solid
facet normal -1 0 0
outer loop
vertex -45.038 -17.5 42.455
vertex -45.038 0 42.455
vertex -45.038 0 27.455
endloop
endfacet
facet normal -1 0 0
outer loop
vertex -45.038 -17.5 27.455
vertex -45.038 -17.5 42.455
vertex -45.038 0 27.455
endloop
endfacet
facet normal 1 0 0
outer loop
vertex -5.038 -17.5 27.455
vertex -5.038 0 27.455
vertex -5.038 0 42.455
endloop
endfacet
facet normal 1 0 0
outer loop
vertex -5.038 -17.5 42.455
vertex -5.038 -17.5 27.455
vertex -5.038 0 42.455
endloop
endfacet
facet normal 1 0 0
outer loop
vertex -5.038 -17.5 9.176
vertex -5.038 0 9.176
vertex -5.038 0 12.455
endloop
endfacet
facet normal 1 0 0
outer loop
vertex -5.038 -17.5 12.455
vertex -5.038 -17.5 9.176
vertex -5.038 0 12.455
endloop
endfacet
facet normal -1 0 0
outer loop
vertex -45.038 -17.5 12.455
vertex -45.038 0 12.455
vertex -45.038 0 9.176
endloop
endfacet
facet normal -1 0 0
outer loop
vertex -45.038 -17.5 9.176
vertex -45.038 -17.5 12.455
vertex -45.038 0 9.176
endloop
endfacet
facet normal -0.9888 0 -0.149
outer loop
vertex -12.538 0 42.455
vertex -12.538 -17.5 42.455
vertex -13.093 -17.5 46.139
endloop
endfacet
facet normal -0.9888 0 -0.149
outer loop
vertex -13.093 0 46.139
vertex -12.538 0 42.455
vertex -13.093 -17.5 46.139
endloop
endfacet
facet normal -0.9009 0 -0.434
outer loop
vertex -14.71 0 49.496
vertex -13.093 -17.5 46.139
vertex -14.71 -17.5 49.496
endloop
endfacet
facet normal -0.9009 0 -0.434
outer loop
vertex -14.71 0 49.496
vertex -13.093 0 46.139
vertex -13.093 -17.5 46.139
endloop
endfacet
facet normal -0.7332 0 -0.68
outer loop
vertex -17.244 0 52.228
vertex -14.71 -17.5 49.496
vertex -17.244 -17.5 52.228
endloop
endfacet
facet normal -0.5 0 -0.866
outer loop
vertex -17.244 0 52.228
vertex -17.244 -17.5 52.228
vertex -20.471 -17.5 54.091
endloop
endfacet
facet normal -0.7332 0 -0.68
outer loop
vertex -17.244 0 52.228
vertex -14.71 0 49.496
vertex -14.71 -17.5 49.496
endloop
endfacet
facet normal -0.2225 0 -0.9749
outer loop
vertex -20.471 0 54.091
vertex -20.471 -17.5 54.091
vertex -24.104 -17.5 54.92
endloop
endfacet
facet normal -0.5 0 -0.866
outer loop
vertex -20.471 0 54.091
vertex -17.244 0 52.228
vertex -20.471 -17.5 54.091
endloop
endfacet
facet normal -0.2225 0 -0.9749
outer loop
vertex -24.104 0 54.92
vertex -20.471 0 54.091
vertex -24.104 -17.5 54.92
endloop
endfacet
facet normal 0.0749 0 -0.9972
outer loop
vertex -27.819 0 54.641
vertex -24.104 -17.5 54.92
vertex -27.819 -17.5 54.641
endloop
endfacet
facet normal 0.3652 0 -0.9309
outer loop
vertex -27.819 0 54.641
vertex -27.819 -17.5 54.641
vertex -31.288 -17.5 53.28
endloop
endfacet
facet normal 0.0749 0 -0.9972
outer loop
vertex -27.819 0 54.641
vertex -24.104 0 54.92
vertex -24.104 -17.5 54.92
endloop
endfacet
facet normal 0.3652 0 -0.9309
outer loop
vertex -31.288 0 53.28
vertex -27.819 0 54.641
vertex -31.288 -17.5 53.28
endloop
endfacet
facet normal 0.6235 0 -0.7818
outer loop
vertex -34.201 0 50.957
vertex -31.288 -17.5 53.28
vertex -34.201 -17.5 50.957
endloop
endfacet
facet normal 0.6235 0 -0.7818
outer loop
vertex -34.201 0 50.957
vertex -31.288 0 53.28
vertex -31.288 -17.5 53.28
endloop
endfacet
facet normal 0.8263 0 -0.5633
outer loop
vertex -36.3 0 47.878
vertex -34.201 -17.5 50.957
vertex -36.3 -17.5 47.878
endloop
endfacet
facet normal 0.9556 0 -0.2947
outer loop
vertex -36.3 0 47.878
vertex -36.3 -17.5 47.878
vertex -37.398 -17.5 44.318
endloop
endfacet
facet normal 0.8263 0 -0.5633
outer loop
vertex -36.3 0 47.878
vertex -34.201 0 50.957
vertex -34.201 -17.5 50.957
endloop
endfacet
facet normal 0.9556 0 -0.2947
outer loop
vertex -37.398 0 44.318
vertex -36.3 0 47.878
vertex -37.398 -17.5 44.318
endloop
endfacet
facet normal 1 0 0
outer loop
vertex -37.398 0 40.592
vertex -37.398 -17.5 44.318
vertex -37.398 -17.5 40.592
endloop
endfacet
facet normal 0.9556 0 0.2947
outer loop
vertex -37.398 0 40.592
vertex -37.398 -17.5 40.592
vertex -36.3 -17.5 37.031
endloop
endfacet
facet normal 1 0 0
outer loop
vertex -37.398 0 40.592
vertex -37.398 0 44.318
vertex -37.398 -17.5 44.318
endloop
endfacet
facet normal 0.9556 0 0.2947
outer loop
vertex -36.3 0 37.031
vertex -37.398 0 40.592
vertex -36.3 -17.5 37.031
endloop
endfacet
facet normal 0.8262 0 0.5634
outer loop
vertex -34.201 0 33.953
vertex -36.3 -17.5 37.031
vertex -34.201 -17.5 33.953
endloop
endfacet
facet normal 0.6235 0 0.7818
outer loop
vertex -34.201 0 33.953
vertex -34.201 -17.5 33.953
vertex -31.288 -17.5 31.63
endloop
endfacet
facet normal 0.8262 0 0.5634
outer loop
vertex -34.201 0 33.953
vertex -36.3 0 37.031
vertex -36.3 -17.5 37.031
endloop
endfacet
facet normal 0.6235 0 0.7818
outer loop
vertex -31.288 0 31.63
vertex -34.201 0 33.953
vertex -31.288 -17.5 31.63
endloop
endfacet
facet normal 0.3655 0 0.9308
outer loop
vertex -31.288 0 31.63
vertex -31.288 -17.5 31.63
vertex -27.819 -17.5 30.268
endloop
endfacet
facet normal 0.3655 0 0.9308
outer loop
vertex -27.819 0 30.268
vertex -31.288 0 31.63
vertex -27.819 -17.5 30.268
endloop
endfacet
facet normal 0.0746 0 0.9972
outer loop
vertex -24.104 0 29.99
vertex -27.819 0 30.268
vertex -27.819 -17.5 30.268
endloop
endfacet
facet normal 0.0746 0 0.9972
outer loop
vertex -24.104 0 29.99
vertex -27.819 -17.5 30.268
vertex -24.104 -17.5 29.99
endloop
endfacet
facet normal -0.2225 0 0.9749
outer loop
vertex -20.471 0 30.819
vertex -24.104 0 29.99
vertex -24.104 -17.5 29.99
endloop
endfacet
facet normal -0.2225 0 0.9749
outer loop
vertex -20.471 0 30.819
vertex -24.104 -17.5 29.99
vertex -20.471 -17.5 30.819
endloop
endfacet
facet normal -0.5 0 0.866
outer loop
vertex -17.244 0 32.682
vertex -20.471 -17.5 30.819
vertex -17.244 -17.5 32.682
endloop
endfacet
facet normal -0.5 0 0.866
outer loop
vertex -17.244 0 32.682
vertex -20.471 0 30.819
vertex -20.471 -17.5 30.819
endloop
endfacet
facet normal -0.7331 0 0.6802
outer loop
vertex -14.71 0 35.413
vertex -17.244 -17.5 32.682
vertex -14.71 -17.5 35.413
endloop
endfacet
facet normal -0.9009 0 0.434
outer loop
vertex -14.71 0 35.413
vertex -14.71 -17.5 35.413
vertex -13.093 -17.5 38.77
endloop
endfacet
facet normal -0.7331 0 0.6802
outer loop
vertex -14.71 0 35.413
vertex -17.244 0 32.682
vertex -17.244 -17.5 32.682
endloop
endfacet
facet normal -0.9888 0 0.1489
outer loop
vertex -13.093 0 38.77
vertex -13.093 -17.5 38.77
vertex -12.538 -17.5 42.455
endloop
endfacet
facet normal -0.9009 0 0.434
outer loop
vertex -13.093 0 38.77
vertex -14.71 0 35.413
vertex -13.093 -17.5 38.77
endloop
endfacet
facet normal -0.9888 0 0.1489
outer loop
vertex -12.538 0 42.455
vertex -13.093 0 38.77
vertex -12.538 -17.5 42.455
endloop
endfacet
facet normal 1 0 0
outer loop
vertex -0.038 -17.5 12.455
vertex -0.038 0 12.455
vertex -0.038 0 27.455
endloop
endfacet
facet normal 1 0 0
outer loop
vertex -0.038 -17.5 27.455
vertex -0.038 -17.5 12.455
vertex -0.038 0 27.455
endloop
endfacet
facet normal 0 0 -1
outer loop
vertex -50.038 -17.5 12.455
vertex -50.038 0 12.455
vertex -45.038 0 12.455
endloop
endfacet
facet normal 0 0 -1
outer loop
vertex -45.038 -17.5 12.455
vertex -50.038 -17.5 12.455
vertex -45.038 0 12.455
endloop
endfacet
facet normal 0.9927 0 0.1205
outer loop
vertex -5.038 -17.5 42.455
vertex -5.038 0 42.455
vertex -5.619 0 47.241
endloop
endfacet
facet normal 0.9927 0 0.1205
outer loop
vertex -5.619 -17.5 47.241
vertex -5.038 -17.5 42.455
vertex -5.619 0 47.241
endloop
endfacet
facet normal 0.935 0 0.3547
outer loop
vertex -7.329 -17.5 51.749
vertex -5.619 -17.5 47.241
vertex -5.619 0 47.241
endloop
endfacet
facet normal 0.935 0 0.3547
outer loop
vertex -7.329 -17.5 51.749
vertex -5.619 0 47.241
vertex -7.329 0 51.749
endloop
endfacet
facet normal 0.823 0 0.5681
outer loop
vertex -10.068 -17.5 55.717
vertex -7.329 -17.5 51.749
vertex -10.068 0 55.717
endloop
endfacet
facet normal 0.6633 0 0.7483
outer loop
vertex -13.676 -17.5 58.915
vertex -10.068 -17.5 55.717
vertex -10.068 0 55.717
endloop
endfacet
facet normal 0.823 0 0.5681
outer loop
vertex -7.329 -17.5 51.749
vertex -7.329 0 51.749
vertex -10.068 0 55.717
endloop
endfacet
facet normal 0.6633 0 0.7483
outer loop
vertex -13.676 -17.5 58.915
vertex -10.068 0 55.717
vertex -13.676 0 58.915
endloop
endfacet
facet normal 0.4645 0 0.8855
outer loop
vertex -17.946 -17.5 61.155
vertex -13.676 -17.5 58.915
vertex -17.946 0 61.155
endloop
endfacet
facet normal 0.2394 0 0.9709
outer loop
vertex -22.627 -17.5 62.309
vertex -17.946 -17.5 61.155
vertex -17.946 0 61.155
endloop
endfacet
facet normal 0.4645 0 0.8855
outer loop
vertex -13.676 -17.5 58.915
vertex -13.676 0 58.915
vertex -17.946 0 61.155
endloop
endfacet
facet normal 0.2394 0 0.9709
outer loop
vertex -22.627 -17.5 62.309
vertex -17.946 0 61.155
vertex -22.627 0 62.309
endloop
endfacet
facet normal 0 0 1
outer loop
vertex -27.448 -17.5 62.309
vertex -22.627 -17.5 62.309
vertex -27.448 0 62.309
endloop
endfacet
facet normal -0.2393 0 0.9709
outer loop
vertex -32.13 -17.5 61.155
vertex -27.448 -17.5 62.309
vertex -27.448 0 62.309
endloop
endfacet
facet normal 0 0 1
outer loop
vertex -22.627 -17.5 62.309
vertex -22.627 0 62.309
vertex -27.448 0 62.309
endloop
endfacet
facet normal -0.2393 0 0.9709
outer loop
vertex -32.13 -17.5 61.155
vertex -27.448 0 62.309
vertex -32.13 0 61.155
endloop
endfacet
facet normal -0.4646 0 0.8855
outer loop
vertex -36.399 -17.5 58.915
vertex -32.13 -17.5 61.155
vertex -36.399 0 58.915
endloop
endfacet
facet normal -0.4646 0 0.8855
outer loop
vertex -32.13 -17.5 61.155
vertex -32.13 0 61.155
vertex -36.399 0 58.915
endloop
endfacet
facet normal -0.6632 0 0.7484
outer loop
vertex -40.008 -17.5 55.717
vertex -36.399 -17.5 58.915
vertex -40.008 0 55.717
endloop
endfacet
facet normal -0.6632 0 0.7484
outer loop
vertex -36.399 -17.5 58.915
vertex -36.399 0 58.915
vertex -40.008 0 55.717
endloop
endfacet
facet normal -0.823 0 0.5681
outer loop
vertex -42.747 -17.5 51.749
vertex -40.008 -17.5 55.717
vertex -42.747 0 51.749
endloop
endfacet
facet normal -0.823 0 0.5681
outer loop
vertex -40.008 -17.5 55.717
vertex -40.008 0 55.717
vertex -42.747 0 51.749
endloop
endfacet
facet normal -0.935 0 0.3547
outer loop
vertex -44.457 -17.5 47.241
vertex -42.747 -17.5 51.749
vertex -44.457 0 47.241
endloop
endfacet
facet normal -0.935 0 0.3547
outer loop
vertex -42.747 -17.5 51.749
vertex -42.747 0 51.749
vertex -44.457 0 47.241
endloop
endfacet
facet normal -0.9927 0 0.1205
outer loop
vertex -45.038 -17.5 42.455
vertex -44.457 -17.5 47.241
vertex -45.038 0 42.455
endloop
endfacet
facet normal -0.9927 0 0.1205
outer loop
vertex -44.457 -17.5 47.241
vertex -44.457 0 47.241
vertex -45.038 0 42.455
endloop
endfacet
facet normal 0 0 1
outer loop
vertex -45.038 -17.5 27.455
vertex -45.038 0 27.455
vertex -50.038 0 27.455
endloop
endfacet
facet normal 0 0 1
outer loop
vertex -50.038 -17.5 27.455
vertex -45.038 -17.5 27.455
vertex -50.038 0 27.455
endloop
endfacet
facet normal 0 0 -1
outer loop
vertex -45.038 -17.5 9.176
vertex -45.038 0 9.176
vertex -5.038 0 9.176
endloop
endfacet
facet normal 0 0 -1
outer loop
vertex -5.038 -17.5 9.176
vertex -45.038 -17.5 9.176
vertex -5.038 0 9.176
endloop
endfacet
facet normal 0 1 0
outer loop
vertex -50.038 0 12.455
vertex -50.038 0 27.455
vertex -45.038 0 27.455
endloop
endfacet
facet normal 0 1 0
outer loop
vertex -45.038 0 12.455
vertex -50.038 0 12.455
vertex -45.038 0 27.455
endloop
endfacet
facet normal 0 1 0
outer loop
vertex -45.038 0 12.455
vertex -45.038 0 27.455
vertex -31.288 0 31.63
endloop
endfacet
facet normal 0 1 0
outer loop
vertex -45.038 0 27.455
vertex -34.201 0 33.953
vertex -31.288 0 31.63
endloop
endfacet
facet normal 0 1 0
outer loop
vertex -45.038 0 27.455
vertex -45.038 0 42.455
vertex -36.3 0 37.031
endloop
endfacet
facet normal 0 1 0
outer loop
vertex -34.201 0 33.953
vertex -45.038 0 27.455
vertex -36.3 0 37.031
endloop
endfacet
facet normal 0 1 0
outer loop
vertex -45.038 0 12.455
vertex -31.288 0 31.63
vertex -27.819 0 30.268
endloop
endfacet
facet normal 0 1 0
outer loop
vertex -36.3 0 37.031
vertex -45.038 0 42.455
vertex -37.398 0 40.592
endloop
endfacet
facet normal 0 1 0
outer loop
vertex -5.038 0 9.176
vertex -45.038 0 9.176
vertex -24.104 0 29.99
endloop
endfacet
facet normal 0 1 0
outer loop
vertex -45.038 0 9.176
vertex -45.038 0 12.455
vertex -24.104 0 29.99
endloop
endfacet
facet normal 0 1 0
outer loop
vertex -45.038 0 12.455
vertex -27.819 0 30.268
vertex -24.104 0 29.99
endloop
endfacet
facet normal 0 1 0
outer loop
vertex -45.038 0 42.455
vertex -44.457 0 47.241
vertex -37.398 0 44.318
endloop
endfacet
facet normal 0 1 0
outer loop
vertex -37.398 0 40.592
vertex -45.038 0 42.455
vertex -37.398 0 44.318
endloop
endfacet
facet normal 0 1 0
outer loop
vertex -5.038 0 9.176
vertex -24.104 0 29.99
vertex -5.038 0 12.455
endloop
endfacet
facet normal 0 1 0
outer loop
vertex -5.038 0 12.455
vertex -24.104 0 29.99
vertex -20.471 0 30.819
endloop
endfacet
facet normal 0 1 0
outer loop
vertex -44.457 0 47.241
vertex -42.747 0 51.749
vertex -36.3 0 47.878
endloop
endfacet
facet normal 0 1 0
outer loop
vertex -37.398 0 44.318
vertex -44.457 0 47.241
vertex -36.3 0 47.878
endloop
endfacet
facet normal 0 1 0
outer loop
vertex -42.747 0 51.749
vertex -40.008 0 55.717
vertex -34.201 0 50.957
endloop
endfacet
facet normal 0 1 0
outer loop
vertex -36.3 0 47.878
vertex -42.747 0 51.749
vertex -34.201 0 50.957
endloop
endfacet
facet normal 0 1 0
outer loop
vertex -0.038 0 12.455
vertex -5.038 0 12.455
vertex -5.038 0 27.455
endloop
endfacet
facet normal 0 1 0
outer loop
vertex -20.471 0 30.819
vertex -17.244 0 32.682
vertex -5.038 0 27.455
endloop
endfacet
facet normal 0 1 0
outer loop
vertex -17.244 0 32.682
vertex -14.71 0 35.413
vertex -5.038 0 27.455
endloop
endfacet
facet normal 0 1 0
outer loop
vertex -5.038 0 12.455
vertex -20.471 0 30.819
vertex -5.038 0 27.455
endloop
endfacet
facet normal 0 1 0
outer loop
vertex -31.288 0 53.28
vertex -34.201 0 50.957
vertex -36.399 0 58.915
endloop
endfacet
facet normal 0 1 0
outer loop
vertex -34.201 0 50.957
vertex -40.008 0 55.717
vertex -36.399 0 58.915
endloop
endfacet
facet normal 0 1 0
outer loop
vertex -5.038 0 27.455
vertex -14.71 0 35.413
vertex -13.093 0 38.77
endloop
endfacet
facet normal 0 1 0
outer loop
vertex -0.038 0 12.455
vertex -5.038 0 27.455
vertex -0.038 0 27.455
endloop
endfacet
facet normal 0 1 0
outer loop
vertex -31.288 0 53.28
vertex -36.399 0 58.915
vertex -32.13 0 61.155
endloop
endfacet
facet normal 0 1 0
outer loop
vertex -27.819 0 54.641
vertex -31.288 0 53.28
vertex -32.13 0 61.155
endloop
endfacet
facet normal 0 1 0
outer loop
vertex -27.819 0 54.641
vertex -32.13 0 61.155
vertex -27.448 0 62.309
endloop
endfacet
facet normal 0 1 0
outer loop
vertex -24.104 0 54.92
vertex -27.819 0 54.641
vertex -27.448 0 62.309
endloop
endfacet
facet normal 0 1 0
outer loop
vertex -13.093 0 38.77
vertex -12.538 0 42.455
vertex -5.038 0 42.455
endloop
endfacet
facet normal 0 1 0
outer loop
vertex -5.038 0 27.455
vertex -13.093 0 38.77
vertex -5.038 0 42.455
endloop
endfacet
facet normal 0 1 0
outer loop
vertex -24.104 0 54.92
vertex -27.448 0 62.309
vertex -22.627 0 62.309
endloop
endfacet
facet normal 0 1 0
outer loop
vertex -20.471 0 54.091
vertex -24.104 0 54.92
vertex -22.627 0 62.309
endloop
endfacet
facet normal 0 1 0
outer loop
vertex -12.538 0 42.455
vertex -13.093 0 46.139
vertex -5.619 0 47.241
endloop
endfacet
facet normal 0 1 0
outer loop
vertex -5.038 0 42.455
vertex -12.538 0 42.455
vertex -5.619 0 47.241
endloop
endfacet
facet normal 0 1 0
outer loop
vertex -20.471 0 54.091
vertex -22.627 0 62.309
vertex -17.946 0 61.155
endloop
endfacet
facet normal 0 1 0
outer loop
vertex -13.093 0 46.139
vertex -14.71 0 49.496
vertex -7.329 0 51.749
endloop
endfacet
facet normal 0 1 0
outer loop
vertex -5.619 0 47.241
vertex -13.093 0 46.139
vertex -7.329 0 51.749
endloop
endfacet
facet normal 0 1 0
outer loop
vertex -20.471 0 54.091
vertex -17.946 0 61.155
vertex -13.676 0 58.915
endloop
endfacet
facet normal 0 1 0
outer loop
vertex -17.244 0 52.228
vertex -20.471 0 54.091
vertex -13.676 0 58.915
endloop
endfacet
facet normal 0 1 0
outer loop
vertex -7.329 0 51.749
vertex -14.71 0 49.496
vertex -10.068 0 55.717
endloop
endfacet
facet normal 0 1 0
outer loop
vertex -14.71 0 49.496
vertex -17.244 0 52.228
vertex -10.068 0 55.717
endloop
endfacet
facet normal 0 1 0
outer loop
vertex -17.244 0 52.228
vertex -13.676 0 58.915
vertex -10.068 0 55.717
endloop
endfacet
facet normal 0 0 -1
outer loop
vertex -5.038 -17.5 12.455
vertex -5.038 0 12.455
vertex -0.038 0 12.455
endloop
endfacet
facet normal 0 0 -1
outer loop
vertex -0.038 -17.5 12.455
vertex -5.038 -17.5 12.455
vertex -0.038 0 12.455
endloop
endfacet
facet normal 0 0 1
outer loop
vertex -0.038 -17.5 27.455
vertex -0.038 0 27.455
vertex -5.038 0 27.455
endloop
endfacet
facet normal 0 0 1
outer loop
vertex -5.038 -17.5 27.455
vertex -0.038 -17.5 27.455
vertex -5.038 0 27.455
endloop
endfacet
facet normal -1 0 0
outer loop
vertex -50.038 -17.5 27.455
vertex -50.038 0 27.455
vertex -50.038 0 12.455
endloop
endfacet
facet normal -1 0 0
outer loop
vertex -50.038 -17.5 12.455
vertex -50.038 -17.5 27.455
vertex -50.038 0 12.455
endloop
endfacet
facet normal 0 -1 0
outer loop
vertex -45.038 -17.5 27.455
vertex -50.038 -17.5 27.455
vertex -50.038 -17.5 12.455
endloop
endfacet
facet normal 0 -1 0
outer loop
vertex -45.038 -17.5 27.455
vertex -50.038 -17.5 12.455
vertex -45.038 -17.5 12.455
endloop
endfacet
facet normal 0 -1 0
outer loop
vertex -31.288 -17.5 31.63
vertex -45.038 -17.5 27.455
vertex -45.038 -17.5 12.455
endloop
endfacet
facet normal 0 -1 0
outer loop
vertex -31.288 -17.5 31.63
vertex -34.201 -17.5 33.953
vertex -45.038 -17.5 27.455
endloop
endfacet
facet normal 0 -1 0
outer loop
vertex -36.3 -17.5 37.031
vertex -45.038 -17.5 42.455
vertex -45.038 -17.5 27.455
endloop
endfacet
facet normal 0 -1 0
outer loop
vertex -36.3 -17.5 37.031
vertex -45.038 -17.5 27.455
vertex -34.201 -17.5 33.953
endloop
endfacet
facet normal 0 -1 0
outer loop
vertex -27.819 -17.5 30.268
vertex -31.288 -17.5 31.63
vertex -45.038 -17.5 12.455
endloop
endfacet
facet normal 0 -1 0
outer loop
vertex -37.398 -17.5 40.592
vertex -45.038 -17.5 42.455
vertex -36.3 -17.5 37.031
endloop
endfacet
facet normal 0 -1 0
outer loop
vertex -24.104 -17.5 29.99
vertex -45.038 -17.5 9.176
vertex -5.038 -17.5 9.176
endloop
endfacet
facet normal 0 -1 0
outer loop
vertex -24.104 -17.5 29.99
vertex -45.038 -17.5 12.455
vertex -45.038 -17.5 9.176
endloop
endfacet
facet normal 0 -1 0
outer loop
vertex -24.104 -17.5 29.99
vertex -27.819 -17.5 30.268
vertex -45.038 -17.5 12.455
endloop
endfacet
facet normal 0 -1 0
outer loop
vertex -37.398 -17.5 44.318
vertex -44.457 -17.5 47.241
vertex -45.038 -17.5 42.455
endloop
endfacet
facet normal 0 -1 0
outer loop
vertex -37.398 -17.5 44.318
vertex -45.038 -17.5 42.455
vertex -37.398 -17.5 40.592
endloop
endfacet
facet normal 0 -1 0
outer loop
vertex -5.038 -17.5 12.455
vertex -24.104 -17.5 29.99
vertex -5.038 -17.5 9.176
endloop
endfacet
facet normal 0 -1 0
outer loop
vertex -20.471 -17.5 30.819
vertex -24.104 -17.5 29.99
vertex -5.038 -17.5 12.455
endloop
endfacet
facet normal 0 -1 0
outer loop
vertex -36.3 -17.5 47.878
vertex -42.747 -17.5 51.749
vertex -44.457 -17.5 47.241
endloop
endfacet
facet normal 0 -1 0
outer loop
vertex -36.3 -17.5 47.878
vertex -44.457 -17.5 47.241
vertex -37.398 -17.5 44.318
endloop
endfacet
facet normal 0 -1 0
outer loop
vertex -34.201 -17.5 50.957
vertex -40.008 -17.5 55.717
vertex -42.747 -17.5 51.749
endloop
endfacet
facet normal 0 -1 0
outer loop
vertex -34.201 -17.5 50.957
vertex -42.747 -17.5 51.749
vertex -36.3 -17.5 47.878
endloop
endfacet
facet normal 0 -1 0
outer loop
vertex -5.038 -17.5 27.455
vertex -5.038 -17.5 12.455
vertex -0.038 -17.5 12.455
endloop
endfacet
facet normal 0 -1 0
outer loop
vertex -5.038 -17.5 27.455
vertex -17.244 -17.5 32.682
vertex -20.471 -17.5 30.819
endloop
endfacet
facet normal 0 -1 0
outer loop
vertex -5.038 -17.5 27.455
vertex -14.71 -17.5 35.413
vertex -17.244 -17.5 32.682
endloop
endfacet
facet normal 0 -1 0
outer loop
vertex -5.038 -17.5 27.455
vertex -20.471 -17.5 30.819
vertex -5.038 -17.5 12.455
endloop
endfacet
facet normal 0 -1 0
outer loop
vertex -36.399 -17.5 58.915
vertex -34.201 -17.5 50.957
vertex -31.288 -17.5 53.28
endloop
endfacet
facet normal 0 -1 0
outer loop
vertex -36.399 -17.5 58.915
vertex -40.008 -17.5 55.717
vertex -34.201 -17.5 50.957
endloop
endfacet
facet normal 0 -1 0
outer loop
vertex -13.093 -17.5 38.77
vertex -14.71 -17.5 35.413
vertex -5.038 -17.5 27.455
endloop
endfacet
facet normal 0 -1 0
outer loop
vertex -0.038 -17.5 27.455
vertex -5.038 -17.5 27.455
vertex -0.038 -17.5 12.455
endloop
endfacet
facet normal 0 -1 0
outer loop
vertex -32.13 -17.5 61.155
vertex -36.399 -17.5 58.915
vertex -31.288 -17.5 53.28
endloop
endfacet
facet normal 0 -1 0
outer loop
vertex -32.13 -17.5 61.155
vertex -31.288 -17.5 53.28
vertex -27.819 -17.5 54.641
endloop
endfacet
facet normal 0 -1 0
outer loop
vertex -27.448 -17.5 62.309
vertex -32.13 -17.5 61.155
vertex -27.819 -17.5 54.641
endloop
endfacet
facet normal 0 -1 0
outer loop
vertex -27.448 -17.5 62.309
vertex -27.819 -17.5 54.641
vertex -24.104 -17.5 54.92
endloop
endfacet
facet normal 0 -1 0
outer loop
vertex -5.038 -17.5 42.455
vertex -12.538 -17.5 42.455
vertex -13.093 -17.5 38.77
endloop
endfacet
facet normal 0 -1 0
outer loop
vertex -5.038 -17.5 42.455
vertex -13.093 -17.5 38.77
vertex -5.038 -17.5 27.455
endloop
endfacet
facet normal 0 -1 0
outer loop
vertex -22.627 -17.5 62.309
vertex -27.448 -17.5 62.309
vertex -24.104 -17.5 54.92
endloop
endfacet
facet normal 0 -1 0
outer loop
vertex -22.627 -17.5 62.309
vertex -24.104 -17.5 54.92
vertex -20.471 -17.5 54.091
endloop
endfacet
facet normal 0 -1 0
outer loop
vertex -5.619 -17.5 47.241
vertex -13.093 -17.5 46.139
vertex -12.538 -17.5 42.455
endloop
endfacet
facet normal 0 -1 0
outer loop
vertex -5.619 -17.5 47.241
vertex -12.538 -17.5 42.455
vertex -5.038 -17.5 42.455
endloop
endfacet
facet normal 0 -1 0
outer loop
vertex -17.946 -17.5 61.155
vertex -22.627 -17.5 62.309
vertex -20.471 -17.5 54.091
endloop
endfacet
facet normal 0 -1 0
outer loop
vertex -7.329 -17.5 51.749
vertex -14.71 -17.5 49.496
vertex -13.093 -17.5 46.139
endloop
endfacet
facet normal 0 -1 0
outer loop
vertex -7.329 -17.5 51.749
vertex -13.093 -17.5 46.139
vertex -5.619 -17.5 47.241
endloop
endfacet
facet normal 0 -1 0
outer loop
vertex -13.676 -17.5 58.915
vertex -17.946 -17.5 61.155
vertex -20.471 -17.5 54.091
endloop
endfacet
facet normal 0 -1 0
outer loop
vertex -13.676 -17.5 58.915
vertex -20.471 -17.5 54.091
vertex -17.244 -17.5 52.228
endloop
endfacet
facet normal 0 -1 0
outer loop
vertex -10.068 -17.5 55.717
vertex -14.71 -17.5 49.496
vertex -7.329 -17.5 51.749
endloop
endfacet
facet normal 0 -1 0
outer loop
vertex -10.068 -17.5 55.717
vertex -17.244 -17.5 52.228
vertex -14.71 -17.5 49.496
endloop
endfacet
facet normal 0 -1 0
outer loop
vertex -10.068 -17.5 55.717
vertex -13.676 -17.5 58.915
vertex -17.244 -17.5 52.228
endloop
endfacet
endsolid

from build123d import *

# Parameters (mm, degrees)
F0_R     = 12.5
F1_DEPTH = 17.5


with BuildPart() as f1:
    # F0 (on Front) → F1 (new body)
    with BuildSketch(Plane.XZ):
        with BuildLine():
            Line((-45.037766, 9.175865), (-5.037766, 9.175865))
            Line((-5.037766, 9.175865), (-5.037766, 12.45487))
            Line((-5.037766, 12.45487), (-0.037766, 12.45487))
            Line((-0.037766, 12.45487), (-0.037766, 27.45487))
            Line((-0.037766, 27.45487), (-5.037766, 27.45487))
            Line((-5.037766, 27.45487), (-5.037766, 42.45487))
            ThreePointArc((-5.037766, 42.45487), (-25.037766, 62.45487), (-45.037766, 42.45487))
            Line((-45.037766, 42.45487), (-45.037766, 27.45487))
            Line((-45.037766, 27.45487), (-50.037766, 27.45487))
            Line((-50.037766, 27.45487), (-50.037766, 12.45487))
            Line((-50.037766, 12.45487), (-45.037766, 12.45487))
            Line((-45.037766, 12.45487), (-45.037766, 9.175865))
        make_face()
        with Locations((-25.037766, 42.45487)):
            Circle(F0_R, mode=Mode.SUBTRACT)
    extrude(amount=F1_DEPTH)


solid = f1.part
